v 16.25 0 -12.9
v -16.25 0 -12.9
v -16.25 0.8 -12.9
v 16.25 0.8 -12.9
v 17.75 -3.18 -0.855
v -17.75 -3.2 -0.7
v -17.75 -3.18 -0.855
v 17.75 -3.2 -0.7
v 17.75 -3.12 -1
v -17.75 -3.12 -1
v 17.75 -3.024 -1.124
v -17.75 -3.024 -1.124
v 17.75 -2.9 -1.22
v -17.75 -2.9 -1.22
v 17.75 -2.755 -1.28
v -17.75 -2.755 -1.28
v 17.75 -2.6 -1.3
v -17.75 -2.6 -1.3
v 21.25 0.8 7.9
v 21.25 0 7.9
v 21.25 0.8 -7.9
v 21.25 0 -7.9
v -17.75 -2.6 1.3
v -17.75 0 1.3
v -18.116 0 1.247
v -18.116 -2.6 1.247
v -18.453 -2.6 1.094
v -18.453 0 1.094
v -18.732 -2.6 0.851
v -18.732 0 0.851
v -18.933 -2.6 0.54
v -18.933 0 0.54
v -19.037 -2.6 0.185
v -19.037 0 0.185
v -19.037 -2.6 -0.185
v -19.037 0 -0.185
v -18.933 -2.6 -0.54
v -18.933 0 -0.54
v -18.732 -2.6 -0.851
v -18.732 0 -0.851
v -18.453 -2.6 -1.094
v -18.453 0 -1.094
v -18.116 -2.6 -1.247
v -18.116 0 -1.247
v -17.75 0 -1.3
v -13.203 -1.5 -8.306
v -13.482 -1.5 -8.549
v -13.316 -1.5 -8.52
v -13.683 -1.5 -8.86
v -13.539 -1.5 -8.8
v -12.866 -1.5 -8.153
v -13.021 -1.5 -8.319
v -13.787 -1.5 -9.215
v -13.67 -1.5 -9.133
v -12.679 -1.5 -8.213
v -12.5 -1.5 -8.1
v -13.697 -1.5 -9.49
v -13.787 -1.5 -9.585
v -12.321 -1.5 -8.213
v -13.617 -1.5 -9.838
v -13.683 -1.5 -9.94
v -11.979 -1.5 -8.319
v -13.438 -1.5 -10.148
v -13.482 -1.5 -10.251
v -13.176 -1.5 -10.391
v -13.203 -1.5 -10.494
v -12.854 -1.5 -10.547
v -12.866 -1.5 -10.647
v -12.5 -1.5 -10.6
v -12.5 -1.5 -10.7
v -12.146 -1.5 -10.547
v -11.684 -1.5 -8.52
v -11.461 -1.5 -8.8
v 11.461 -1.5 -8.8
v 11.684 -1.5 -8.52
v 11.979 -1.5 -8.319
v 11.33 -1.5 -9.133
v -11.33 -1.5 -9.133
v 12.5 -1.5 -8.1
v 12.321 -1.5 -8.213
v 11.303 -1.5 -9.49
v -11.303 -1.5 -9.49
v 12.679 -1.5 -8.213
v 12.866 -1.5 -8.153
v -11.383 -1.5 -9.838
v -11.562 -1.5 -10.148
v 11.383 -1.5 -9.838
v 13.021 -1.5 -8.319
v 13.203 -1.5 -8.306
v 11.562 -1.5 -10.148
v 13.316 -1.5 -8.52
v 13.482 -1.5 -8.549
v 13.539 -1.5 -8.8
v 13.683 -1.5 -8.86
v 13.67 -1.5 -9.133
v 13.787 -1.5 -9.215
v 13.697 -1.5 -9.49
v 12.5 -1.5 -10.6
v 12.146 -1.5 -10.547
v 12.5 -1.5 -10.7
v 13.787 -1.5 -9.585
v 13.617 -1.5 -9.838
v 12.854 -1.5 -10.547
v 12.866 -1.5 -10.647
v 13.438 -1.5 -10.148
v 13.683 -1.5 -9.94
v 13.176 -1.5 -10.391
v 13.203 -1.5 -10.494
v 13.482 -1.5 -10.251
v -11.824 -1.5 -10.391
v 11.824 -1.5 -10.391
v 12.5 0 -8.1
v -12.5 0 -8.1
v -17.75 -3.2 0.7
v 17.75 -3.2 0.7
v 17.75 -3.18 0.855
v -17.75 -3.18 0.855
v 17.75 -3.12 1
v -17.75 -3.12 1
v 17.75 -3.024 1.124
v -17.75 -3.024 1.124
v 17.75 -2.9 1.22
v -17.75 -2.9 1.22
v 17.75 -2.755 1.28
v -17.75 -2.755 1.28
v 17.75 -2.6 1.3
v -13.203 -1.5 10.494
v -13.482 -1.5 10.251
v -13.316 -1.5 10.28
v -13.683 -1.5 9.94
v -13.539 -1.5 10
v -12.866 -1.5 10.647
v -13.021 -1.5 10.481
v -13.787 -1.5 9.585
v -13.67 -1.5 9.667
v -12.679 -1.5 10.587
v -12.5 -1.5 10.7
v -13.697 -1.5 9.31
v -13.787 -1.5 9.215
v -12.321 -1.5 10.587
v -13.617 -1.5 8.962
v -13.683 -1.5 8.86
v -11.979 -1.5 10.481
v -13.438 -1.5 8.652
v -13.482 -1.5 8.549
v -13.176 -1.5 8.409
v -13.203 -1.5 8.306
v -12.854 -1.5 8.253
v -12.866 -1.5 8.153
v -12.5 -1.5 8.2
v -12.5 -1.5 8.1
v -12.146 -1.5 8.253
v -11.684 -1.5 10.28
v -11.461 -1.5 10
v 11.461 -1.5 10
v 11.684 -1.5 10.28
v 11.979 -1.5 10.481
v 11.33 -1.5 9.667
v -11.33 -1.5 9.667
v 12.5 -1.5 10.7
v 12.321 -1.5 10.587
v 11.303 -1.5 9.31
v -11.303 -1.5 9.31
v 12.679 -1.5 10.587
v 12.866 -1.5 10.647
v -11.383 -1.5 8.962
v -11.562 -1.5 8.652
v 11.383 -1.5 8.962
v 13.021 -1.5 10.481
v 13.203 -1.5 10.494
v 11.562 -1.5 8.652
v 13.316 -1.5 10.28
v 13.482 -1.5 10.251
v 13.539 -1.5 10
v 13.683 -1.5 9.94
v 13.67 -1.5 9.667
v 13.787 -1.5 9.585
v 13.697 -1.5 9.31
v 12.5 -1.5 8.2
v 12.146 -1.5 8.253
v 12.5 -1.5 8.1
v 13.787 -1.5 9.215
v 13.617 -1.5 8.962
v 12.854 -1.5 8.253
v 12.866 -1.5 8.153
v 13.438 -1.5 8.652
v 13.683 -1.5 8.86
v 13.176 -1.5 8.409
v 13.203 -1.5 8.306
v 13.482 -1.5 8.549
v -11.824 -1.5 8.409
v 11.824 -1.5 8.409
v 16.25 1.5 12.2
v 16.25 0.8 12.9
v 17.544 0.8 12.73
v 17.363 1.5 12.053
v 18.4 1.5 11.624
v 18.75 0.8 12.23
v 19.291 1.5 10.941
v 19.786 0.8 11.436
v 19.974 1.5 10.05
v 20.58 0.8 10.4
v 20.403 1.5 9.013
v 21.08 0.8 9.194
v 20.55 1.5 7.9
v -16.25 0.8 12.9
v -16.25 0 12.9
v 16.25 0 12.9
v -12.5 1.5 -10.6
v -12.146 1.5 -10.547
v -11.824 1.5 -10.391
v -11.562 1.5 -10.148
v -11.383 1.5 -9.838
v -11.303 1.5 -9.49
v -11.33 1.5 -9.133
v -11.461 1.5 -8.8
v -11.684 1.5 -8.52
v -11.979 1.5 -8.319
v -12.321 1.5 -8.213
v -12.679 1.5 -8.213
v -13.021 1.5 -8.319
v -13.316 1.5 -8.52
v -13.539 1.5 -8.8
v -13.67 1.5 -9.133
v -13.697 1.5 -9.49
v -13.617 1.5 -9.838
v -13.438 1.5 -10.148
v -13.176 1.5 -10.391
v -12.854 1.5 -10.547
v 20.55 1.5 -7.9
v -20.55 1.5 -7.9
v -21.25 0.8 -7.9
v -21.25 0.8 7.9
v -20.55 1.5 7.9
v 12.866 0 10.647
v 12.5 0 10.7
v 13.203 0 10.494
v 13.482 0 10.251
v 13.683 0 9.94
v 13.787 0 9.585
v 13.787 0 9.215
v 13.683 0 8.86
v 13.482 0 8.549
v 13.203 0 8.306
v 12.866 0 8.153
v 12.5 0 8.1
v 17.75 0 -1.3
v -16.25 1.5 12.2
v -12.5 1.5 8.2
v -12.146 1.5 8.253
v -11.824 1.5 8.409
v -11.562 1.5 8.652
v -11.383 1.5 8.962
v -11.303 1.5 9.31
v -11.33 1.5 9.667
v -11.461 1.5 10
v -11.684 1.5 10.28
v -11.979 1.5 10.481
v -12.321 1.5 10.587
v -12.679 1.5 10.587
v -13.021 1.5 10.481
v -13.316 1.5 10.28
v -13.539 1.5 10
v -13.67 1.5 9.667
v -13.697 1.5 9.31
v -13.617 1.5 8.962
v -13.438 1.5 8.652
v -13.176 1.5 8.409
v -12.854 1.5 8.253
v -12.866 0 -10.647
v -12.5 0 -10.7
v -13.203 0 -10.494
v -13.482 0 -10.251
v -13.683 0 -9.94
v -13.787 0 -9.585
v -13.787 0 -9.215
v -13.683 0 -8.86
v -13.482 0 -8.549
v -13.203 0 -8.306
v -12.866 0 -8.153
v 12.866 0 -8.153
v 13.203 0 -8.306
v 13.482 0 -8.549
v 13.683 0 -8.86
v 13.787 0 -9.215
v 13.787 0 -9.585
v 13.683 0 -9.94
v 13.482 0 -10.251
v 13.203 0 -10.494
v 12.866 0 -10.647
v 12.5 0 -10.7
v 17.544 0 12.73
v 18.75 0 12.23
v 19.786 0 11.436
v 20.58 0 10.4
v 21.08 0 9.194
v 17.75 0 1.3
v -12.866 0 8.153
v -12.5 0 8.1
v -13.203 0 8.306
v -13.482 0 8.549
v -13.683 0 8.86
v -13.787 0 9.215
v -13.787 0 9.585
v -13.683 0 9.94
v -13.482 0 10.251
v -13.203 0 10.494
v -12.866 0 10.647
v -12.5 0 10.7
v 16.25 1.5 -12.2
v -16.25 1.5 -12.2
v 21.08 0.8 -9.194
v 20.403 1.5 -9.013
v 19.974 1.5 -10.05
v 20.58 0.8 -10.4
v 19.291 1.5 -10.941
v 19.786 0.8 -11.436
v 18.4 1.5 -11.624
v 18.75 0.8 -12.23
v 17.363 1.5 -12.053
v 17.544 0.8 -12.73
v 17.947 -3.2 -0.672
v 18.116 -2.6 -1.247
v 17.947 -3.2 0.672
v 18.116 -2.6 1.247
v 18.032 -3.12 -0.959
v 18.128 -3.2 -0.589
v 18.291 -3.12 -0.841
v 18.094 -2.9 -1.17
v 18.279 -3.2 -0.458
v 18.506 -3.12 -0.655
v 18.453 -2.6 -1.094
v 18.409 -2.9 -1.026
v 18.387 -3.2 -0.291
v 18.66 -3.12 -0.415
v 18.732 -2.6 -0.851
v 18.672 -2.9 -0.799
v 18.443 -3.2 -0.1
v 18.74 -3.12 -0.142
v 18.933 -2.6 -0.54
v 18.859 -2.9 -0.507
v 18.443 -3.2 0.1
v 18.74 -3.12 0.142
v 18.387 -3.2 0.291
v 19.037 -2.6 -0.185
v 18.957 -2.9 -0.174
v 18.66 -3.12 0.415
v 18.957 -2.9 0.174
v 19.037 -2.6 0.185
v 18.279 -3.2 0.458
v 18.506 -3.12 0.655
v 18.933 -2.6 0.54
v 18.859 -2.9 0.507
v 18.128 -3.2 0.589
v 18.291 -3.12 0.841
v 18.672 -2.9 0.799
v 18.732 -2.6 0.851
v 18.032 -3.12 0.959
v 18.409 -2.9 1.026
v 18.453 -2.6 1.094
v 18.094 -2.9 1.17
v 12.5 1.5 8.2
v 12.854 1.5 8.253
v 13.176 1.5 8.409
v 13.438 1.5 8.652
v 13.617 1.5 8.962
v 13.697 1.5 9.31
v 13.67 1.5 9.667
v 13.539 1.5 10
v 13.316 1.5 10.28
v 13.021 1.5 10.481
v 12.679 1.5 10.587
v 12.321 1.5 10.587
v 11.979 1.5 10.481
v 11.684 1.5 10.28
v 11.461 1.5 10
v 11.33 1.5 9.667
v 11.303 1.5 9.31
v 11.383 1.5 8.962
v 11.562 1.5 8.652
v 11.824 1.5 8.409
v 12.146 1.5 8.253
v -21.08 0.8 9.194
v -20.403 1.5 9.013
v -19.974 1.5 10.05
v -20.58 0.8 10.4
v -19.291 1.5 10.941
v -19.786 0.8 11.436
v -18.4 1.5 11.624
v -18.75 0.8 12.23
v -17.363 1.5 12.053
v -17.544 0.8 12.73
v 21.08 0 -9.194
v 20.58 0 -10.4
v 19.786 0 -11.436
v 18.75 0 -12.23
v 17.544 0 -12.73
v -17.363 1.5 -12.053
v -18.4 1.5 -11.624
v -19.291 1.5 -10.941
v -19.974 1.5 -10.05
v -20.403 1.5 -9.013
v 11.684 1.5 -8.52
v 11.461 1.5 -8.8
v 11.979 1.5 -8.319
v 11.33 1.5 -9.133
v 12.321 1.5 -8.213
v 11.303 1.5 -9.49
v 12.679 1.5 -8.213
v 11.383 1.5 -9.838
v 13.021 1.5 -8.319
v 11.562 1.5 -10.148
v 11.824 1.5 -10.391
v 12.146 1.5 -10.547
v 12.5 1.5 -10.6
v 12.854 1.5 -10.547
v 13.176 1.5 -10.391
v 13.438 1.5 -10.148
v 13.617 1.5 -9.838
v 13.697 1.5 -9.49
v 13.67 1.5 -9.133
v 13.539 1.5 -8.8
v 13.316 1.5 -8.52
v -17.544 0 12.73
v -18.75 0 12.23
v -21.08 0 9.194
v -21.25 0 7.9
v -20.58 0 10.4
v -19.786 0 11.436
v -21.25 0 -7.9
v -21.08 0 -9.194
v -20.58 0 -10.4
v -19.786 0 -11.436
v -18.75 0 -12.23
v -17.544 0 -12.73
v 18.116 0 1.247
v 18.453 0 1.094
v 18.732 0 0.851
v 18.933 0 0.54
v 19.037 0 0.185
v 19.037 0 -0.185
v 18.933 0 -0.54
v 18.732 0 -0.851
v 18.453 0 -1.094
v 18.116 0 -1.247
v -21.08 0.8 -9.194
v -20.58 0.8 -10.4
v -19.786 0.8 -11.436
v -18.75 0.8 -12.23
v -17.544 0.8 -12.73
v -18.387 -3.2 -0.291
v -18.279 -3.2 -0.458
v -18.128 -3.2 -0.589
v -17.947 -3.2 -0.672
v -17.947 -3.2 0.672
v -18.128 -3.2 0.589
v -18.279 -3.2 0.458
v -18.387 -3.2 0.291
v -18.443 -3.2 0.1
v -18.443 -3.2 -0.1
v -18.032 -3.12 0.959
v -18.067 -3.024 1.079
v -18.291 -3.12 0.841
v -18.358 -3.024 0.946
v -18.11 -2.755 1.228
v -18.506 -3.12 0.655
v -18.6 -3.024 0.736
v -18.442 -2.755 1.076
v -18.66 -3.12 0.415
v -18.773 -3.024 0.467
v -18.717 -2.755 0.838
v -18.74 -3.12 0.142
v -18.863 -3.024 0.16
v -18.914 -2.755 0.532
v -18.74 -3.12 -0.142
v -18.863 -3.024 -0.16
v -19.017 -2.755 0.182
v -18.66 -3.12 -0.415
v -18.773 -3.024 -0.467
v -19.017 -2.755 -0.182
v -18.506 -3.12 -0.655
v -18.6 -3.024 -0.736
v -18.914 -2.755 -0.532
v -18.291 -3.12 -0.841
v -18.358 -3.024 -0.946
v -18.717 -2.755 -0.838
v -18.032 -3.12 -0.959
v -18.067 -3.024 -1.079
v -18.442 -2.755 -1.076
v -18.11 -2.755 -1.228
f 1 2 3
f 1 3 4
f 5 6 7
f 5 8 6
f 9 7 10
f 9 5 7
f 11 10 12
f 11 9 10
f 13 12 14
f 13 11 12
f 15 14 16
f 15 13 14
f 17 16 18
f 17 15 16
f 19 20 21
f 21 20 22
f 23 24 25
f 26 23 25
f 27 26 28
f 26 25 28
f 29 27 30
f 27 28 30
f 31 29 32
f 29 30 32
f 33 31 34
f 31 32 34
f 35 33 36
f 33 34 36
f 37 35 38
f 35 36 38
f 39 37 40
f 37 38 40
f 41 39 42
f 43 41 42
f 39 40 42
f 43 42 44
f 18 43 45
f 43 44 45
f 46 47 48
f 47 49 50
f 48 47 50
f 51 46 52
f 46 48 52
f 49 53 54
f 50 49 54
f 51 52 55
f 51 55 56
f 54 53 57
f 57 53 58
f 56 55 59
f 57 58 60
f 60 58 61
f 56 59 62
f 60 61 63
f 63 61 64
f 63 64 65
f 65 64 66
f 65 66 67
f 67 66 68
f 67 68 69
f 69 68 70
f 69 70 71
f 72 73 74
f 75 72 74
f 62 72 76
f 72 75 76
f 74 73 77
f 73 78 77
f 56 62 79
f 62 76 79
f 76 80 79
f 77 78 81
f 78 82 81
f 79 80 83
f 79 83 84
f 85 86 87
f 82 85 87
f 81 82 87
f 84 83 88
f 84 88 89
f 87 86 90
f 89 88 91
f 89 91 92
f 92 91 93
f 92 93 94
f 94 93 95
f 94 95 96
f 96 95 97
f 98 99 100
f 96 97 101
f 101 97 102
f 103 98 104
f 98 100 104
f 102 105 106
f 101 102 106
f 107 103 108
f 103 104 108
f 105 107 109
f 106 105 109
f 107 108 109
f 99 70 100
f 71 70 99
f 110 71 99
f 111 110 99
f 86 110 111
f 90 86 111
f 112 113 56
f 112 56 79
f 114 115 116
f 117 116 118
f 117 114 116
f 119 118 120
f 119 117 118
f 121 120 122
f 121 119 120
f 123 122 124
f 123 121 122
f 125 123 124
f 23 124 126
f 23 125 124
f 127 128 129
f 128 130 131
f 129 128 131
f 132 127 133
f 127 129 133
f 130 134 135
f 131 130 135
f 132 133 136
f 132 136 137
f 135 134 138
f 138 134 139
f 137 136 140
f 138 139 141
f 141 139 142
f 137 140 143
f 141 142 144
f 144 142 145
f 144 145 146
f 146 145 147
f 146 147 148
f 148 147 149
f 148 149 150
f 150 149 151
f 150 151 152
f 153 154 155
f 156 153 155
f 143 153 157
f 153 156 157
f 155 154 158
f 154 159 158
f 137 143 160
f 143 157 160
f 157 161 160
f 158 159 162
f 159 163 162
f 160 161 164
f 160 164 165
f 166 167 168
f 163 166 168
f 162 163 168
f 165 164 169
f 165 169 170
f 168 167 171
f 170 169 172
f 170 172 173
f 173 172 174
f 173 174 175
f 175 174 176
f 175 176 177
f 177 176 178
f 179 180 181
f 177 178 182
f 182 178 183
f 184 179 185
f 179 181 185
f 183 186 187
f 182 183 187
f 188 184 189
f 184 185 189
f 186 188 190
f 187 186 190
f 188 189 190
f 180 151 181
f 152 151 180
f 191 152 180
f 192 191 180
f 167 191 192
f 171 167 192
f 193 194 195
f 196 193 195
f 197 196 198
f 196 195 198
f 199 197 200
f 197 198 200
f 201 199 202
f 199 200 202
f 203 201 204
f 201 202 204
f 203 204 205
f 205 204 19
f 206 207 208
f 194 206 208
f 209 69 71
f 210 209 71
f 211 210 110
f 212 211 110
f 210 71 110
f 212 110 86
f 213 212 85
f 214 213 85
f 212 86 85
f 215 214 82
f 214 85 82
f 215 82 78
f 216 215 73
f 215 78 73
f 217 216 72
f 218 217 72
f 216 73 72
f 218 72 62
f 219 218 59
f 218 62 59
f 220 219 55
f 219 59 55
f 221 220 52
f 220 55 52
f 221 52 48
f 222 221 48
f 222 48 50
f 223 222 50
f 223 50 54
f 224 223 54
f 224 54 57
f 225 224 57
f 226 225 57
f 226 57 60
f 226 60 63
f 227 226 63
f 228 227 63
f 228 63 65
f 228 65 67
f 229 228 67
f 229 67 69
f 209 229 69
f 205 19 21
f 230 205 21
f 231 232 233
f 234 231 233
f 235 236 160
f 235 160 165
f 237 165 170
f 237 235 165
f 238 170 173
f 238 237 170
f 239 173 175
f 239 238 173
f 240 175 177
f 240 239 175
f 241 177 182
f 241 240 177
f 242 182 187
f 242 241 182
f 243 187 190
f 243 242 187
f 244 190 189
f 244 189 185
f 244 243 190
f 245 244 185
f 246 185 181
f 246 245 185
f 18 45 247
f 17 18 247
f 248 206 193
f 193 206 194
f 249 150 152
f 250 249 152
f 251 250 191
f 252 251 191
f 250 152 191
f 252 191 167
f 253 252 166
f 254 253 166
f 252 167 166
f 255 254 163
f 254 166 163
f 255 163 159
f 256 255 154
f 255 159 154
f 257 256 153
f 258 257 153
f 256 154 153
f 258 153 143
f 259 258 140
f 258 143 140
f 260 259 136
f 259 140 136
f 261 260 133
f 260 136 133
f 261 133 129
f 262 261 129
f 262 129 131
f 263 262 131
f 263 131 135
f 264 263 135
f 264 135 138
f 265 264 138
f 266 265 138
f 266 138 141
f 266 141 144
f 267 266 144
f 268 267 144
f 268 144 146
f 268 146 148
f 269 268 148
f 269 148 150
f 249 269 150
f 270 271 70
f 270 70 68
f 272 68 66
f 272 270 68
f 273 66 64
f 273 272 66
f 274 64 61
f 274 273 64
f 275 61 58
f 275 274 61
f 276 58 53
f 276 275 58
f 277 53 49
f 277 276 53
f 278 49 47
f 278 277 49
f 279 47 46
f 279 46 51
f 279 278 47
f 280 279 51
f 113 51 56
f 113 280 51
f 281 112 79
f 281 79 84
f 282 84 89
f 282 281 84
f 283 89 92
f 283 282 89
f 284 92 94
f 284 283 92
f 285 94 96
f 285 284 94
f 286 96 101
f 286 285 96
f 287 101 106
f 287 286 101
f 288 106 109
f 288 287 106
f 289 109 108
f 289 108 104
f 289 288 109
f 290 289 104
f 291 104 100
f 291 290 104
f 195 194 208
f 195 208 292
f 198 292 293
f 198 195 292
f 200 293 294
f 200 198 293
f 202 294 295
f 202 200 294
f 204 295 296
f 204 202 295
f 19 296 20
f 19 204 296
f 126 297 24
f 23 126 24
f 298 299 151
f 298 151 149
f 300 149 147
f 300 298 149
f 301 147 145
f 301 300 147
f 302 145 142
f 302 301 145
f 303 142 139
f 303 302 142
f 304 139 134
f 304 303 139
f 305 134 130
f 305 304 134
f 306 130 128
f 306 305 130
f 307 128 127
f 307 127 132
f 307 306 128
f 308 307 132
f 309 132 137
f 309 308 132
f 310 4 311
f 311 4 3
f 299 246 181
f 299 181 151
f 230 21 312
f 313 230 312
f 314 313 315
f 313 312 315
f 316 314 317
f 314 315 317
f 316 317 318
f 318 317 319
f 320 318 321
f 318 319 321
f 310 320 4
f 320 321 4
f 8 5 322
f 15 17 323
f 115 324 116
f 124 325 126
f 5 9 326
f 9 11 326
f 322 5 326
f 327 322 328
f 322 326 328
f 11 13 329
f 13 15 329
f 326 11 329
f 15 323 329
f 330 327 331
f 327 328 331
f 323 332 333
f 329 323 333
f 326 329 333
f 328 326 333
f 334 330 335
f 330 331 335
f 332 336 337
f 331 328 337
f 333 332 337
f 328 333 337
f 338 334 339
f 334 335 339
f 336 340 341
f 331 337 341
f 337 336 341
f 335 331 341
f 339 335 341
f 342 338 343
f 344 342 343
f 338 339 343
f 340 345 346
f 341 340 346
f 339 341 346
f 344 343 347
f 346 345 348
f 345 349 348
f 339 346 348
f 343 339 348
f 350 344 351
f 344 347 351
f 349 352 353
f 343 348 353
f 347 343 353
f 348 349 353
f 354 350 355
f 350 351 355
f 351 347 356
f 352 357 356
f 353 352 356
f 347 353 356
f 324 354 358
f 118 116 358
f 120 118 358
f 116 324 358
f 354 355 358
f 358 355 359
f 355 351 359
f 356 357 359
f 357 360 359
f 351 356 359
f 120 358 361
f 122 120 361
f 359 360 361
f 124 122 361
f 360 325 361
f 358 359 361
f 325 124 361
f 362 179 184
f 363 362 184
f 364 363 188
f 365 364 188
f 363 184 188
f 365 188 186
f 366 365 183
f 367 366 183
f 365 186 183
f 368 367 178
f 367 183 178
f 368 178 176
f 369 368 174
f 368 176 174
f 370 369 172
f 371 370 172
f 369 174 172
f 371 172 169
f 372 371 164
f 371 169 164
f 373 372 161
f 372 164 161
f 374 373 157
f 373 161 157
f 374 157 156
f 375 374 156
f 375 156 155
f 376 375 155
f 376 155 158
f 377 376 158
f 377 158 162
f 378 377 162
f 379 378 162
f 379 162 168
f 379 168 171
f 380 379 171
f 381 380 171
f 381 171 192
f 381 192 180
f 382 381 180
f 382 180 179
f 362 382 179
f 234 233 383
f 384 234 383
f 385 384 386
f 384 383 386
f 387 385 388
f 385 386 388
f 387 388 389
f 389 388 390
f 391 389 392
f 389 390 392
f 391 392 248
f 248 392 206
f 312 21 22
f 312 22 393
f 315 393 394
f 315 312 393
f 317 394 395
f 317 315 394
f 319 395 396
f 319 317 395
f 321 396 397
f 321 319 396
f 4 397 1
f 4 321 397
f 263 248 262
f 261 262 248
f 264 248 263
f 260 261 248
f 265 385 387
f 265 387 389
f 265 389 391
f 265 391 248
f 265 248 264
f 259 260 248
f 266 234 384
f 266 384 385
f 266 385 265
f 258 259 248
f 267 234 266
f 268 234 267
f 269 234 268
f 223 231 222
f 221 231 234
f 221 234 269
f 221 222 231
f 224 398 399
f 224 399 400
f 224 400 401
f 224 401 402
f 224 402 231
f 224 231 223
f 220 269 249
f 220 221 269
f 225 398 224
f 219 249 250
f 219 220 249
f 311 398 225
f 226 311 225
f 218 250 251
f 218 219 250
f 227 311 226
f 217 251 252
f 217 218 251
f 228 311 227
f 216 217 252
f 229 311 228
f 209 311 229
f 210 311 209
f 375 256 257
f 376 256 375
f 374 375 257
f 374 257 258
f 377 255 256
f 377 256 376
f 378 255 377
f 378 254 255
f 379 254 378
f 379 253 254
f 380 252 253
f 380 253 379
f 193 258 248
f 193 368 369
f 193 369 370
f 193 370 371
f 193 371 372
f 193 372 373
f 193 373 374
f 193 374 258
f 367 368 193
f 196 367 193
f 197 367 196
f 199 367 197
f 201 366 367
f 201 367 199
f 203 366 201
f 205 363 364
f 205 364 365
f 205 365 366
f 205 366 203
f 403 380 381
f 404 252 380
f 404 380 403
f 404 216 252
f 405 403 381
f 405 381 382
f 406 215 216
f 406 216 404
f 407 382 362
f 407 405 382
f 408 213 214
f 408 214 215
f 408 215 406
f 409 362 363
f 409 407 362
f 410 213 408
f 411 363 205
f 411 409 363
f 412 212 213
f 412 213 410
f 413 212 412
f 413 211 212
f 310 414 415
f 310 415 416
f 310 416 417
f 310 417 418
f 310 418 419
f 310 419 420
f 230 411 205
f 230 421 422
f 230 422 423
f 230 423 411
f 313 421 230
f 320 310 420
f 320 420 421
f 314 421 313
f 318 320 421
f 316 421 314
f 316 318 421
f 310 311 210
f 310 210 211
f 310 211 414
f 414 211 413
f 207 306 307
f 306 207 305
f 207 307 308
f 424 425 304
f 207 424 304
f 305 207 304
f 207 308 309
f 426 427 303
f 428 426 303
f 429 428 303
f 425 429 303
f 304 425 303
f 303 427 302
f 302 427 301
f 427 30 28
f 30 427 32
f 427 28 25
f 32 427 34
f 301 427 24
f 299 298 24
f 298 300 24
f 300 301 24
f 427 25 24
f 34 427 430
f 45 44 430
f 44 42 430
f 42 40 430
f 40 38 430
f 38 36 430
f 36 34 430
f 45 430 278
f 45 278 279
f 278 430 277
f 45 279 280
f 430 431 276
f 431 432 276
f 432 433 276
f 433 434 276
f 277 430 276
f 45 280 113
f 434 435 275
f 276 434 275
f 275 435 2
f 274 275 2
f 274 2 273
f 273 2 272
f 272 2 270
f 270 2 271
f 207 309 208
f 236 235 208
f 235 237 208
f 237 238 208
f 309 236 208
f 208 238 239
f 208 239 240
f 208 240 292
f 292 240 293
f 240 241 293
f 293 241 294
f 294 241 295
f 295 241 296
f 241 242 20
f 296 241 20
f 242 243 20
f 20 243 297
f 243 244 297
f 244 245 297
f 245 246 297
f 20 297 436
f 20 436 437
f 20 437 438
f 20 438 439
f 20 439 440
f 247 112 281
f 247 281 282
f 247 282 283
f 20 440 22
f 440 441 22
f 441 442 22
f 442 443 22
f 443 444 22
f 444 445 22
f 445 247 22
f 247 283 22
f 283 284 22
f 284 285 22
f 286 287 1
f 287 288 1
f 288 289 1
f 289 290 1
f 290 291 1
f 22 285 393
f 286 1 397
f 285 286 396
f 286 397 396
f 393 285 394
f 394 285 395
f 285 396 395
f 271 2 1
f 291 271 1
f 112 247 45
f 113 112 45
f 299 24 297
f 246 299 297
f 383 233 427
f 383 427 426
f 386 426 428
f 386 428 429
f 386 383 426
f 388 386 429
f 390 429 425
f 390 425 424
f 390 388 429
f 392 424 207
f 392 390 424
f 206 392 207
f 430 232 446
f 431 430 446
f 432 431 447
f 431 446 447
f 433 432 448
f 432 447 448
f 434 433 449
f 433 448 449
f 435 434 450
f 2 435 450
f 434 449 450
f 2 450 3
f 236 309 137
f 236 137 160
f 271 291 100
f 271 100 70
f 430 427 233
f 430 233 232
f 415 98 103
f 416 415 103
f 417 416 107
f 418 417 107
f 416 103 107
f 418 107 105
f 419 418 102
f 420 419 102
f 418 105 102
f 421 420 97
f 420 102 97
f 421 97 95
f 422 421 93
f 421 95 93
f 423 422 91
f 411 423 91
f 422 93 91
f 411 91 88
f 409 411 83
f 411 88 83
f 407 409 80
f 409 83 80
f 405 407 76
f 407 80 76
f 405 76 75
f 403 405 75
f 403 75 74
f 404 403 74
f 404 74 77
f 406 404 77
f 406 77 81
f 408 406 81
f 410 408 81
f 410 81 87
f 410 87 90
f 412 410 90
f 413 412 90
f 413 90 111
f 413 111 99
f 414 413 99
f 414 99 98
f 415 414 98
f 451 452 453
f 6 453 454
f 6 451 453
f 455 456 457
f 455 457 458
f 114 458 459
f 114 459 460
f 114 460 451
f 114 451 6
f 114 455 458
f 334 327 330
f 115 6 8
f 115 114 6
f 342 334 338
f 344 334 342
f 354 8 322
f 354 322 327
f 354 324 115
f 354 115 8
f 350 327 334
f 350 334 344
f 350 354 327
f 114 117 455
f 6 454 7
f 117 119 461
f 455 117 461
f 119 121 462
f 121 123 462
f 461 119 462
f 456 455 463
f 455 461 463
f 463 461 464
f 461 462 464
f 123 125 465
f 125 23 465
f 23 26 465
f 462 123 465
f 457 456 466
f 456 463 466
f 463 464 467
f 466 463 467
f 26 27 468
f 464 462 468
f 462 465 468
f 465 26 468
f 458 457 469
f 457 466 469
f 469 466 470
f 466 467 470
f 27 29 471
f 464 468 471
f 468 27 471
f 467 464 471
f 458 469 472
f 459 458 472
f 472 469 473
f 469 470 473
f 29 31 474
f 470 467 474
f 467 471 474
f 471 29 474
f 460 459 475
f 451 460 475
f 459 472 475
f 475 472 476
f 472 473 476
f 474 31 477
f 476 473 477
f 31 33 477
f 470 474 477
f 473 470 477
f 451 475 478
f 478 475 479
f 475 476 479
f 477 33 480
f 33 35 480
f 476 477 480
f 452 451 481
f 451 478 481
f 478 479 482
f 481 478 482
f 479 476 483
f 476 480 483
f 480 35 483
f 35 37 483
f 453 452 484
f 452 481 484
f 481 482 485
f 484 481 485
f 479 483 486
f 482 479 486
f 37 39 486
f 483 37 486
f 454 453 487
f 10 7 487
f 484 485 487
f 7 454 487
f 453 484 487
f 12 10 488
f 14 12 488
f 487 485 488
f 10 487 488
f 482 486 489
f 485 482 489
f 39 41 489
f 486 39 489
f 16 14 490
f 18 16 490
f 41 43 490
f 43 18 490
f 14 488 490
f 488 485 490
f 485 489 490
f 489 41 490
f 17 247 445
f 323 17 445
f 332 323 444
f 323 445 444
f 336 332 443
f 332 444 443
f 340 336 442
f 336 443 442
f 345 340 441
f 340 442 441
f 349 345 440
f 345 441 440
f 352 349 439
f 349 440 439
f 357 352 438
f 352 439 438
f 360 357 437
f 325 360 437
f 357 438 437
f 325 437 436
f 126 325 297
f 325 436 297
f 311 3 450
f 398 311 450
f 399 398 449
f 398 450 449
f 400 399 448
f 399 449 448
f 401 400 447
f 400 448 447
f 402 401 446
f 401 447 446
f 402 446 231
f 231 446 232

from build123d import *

# Parameters (mm, degrees)
SKETCH2_W           = 42.5
SKETCH2_H           = 25.8
BOSS_EXTRUDE1_DEPTH = 1.5
FILLET1_R           = 5
CHAMFER1_SIZE       = 0.7
BOSS_EXTRUDE2_DEPTH = 1.5
BOSS_EXTRUDE3_DEPTH = 1.7
FILLET2_R           = 0.6
SKETCH5_R           = 1.2
CUT_EXTRUDE1_DEPTH  = 26.039418923


with BuildPart() as part:
    # Sketch2 → Boss-Extrude1 (new body)
    with BuildSketch(Plane(origin=(0, 0, 0), x_dir=(1, 0, 0), z_dir=(0, 1, 0))):
        Rectangle(SKETCH2_W, SKETCH2_H)
    extrude(amount=BOSS_EXTRUDE1_DEPTH)

    # Fillet1
    fillet1_edges = [part.edges().sort_by_distance(p)[0] for p in [
        (21.25, 0.75, -12.9),
        (21.25, 0.75, 12.9),
        (-21.25, 0.75, 12.9),
        (-21.25, 0.75, -12.9),
    ]]
    fillet(fillet1_edges, radius=FILLET1_R)

    # Chamfer1
    chamfer1_edges = [part.edges().sort_by_distance(p)[0] for p in [
        (21.25, 1.5, 0),
        (0, 1.5, 12.9),
        (0, 1.5, -12.9),
        (-21.25, 1.5, 0),
        (-19.785533906, 1.5, 11.435533906),
        (-19.785533906, 1.5, -11.435533906),
        (19.785533906, 1.5, -11.435533906),
        (19.785533906, 1.5, 11.435533906),
    ]]
    chamfer(chamfer1_edges, length=CHAMFER1_SIZE)

    # Sketch3 → Boss-Extrude2 (add)
    with BuildSketch(Plane(origin=(0, 0, 0), x_dir=(1, 0, 0), z_dir=(0, 1, 0))):
        with BuildLine():
            Line((17.75, 1.3), (-17.75, 1.3))
            ThreePointArc((-17.75, 1.3), (-19.05, 0), (-17.75, -1.3))
            Line((-17.75, -1.3), (17.75, -1.3))
            ThreePointArc((17.75, -1.3), (19.05, 0), (17.75, 1.3))
        make_face()
        with BuildLine():
            Line((12.5, 10.7), (-12.5, 10.7))
            ThreePointArc((-12.5, 10.7), (-13.8, 9.4), (-12.5, 8.1))
            Line((-12.5, 8.1), (12.5, 8.1))
            ThreePointArc((12.5, 8.1), (13.8, 9.4), (12.5, 10.7))
        make_face()
        with BuildLine():
            Line((12.5, -8.1), (-12.5, -8.1))
            ThreePointArc((-12.5, -8.1), (-13.8, -9.4), (-12.5, -10.7))
            Line((-12.5, -10.7), (12.5, -10.7))
            ThreePointArc((12.5, -10.7), (13.8, -9.4), (12.5, -8.1))
        make_face()
    extrude(amount=-BOSS_EXTRUDE2_DEPTH)

    # Sketch4 → Boss-Extrude3 (add)
    with BuildSketch(Plane.XZ.offset(1.5)):
        with BuildLine():
            Line((17.75, 1.3), (-17.75, 1.3))
            ThreePointArc((-17.75, 1.3), (-19.05, 0), (-17.75, -1.3))
            Line((-17.75, -1.3), (17.75, -1.3))
            ThreePointArc((17.75, -1.3), (19.05, 0), (17.75, 1.3))
        make_face()
    extrude(amount=BOSS_EXTRUDE3_DEPTH)

    # Fillet2
    fillet2_edges = [part.edges().sort_by_distance(p)[0] for p in [
        (19.05, -3.2, 0),
        (0, -3.2, -1.3),
        (-19.05, -3.2, 0),
        (0, -3.2, 1.3),
    ]]
    fillet(fillet2_edges, radius=FILLET2_R)

    # Sketch5 → Cut-Extrude1 (cut, through all)
    with BuildSketch(Plane.XZ.offset(1.5)):
        with Locations(Location((-12.5, 9.4, 0), (0, 0, 270))):
            Circle(SKETCH5_R)
        with Locations(Location((12.5, 9.4, 0), (0, 0, 270))):
            Circle(SKETCH5_R)
        with Locations(Location((12.5, -9.4, 0), (0, 0, 270))):
            Circle(SKETCH5_R)
        with Locations(Location((-12.5, -9.4, 0), (0, 0, 270))):
            Circle(SKETCH5_R)
    extrude(amount=-CUT_EXTRUDE1_DEPTH, mode=Mode.SUBTRACT)


solid = part.part
